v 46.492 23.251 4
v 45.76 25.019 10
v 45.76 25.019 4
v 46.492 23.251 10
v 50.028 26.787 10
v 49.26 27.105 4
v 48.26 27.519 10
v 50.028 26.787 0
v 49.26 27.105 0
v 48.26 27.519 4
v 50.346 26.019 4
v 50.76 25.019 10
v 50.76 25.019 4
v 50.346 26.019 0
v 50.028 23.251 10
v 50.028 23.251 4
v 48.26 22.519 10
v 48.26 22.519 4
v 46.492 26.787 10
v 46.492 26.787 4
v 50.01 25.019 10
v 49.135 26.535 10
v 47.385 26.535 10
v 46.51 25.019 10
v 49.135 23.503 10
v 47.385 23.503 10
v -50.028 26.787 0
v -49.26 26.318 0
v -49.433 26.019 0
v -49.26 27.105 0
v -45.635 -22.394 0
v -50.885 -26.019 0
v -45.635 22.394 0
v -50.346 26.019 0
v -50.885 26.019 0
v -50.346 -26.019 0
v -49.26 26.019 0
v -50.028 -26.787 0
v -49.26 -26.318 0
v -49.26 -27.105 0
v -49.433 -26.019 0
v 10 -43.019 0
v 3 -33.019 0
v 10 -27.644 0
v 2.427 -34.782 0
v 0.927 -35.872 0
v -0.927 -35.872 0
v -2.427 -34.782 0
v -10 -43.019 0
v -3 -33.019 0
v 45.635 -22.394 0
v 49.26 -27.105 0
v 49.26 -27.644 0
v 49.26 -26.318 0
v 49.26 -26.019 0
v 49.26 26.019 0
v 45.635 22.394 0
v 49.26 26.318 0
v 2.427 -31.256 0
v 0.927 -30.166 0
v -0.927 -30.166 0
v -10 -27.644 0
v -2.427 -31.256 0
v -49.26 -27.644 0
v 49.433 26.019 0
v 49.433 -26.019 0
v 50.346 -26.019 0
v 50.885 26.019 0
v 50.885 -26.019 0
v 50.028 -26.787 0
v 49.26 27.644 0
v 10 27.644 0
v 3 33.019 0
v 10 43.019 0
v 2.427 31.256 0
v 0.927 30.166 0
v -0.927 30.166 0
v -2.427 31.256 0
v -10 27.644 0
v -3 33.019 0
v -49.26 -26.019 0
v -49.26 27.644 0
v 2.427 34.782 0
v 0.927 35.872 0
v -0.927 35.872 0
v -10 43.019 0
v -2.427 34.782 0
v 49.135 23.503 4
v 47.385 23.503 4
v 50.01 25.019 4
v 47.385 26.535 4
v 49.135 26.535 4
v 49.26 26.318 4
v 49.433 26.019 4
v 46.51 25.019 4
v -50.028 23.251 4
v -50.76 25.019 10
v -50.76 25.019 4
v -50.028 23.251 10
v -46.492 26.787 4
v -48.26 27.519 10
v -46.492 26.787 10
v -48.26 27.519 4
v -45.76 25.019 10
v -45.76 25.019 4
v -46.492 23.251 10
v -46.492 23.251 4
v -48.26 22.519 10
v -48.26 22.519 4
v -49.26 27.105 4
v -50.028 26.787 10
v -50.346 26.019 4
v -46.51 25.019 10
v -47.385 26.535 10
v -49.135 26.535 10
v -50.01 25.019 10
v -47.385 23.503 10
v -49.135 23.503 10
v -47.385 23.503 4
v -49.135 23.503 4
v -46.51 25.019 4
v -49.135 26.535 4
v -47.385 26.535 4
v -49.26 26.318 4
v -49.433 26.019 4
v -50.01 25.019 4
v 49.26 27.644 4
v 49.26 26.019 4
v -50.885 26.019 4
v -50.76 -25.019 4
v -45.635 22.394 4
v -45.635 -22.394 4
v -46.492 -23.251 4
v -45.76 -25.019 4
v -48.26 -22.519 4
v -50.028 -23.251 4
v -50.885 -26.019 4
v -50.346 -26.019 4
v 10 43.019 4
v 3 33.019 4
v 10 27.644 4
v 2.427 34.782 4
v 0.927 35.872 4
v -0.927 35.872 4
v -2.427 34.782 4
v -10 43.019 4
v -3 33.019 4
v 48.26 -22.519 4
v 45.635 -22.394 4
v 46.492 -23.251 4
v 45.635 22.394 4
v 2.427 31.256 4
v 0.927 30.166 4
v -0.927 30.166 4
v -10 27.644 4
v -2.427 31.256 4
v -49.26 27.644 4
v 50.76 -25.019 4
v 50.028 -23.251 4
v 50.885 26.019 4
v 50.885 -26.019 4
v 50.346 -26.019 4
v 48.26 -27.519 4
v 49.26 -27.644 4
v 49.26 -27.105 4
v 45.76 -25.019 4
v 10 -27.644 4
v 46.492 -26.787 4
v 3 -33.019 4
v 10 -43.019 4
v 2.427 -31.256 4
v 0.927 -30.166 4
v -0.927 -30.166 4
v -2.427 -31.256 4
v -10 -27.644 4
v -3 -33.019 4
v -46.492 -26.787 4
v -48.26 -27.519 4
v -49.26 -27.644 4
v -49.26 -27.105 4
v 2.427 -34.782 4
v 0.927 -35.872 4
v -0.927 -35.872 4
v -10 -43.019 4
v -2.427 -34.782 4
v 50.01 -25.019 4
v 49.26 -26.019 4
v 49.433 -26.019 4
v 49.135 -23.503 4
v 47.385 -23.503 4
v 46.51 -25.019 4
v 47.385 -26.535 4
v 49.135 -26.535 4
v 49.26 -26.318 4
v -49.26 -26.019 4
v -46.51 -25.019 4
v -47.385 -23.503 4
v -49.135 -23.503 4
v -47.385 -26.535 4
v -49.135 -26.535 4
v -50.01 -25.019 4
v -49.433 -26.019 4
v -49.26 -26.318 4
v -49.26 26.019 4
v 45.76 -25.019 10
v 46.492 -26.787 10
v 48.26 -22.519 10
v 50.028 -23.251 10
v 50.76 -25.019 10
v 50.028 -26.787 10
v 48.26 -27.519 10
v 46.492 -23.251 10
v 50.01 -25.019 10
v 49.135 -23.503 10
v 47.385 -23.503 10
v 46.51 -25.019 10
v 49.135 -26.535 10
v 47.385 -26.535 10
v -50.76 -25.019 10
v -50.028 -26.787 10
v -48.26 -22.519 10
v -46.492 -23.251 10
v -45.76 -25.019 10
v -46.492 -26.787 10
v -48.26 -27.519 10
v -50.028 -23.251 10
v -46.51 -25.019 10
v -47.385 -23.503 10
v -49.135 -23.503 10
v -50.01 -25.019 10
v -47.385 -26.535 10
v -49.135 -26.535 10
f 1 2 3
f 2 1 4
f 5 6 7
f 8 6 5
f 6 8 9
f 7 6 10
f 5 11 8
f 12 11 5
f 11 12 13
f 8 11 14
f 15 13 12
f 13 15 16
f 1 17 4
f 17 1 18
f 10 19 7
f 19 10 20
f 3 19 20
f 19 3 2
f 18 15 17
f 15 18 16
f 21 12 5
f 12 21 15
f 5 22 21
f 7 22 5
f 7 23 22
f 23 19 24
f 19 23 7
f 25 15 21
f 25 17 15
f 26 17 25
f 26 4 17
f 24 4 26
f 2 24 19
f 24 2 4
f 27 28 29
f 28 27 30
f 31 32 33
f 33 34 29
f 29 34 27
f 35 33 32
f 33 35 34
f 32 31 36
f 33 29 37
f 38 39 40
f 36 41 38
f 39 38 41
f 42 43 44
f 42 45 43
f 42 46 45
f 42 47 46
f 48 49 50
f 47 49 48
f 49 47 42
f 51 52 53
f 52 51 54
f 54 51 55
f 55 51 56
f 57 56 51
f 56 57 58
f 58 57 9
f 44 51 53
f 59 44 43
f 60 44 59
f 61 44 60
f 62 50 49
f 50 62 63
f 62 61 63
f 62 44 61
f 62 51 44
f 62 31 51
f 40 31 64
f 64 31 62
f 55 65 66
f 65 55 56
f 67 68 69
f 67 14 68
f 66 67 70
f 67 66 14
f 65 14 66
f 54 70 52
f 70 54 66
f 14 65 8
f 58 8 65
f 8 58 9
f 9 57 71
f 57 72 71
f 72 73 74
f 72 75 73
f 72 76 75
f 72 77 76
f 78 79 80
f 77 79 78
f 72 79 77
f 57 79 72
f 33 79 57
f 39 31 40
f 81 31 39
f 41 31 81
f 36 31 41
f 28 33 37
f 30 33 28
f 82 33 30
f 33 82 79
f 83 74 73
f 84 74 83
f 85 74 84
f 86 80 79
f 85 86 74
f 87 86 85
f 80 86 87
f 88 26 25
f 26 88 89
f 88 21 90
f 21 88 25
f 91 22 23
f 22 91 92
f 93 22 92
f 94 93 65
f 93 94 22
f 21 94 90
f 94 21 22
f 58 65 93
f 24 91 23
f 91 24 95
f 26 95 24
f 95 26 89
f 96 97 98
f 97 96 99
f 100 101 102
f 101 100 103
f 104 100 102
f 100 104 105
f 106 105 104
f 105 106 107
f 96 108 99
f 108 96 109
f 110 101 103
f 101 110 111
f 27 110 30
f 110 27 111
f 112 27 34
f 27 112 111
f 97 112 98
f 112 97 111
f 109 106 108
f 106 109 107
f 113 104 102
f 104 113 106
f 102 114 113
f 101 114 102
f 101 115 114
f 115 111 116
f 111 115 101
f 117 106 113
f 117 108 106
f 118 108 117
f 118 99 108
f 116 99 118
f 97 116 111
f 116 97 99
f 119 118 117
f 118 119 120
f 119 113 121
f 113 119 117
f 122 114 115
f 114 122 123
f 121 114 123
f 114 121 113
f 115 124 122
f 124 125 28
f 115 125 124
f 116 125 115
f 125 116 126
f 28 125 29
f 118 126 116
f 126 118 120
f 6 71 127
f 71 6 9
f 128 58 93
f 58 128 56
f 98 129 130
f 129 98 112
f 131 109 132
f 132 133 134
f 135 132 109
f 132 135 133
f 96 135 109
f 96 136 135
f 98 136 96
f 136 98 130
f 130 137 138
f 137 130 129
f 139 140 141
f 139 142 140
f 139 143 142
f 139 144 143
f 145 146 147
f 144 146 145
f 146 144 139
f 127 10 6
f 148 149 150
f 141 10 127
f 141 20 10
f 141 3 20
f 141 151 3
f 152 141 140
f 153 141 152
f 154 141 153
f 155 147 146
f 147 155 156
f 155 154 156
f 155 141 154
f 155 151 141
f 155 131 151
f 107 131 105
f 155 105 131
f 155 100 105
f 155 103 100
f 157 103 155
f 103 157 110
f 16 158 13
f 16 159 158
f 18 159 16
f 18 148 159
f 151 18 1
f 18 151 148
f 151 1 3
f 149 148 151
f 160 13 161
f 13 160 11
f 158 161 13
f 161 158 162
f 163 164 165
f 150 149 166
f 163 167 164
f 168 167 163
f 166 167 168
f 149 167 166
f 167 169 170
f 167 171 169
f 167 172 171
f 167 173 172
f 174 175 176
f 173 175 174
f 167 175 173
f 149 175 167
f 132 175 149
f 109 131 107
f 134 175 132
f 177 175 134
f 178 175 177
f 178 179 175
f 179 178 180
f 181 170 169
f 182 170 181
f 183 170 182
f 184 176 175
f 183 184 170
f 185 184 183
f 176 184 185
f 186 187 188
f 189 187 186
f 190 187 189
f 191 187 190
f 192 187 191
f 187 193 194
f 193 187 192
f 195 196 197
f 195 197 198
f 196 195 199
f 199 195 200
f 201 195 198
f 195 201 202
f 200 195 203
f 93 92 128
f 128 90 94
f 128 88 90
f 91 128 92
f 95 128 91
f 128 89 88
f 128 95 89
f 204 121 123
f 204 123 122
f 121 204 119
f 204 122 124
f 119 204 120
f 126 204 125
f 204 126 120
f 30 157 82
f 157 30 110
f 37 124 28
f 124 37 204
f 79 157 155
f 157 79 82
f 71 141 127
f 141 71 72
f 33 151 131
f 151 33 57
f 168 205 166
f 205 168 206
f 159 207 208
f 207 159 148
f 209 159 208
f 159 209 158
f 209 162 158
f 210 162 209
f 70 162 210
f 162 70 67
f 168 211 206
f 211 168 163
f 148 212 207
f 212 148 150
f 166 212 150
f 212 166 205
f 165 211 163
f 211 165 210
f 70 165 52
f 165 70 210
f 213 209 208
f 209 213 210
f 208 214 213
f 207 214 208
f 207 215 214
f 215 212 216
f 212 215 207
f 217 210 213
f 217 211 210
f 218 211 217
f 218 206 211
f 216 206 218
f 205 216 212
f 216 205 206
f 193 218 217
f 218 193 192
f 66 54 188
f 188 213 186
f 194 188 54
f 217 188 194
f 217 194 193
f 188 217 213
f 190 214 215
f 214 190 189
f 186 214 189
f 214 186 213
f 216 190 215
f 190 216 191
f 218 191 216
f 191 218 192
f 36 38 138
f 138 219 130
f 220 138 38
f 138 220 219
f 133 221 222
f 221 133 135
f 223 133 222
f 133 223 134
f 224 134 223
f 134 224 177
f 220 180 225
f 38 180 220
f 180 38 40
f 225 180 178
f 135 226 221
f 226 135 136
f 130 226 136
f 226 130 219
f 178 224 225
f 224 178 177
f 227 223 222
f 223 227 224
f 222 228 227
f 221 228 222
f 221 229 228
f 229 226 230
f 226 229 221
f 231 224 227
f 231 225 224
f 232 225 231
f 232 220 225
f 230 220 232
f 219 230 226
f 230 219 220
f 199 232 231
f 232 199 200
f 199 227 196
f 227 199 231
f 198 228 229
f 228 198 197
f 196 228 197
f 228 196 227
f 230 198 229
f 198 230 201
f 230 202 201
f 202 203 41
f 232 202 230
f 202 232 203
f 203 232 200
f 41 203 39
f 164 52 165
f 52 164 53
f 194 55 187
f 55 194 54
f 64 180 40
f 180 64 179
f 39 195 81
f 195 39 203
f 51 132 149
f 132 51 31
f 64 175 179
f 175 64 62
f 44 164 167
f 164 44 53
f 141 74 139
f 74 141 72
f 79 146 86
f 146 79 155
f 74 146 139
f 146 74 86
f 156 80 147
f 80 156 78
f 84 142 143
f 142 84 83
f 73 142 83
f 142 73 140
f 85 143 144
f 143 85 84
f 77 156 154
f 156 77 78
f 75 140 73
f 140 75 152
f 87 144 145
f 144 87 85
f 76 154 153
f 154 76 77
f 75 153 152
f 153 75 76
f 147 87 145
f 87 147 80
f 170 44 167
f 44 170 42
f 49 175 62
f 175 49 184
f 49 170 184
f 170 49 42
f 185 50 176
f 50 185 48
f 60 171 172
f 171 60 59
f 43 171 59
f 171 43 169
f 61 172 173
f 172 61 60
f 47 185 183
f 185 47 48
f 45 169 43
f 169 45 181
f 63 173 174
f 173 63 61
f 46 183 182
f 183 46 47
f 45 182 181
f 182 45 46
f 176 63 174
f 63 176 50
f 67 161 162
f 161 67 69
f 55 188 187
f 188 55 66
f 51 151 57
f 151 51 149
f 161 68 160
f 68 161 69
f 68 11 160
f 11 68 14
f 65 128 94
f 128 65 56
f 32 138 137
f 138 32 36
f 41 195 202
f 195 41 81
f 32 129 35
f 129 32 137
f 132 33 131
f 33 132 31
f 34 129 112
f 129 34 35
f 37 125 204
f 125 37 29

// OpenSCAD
union() {
	translate(v = [0, 25.0190000000, 0]) {
		union() {
			translate(v = [0, 0, 2.0000000000]) {
				cube(center = true, size = [98.5200000000, 5.2500000000, 4]);
			}
			translate(v = [48.2600000000, 0, 0]) {
				difference() {
					cylinder(d = 5, h = 10);
					cylinder(d = 3.5000000000, h = 10);
				}
			}
			translate(v = [-48.2600000000, 0, 0]) {
				difference() {
					cylinder(d = 5, h = 10);
					cylinder(d = 3.5000000000, h = 10);
				}
			}
		}
	}
	translate(v = [0, -25.0190000000, 0]) {
		union() {
			translate(v = [0, 0, 2.0000000000]) {
				cube(center = true, size = [98.5200000000, 5.2500000000, 4]);
			}
			translate(v = [48.2600000000, 0, 0]) {
				difference() {
					cylinder(d = 5, h = 10);
					cylinder(d = 3.5000000000, h = 10);
				}
			}
			translate(v = [-48.2600000000, 0, 0]) {
				difference() {
					cylinder(d = 5, h = 10);
					cylinder(d = 3.5000000000, h = 10);
				}
			}
		}
	}
	translate(v = [48.2600000000, 0, 0]) {
		rotate(a = [0, 0, 90]) {
			translate(v = [0, 0, 2.0000000000]) {
				cube(center = true, size = [52.0380000000, 5.2500000000, 4]);
			}
		}
	}
	translate(v = [-48.2600000000, 0, 0]) {
		rotate(a = [0, 0, 90]) {
			translate(v = [0, 0, 2.0000000000]) {
				cube(center = true, size = [52.0380000000, 5.2500000000, 4]);
			}
		}
	}
	translate(v = [0, 33.0190000000, 0]) {
		difference() {
			translate(v = [0, 0, 2.0000000000]) {
				cube(center = true, size = [20, 20, 4]);
			}
			cylinder(d = 6, h = 30);
		}
	}
	translate(v = [0, -33.0190000000, 0]) {
		difference() {
			translate(v = [0, 0, 2.0000000000]) {
				cube(center = true, size = [20, 20, 4]);
			}
			cylinder(d = 6, h = 30);
		}
	}
}
